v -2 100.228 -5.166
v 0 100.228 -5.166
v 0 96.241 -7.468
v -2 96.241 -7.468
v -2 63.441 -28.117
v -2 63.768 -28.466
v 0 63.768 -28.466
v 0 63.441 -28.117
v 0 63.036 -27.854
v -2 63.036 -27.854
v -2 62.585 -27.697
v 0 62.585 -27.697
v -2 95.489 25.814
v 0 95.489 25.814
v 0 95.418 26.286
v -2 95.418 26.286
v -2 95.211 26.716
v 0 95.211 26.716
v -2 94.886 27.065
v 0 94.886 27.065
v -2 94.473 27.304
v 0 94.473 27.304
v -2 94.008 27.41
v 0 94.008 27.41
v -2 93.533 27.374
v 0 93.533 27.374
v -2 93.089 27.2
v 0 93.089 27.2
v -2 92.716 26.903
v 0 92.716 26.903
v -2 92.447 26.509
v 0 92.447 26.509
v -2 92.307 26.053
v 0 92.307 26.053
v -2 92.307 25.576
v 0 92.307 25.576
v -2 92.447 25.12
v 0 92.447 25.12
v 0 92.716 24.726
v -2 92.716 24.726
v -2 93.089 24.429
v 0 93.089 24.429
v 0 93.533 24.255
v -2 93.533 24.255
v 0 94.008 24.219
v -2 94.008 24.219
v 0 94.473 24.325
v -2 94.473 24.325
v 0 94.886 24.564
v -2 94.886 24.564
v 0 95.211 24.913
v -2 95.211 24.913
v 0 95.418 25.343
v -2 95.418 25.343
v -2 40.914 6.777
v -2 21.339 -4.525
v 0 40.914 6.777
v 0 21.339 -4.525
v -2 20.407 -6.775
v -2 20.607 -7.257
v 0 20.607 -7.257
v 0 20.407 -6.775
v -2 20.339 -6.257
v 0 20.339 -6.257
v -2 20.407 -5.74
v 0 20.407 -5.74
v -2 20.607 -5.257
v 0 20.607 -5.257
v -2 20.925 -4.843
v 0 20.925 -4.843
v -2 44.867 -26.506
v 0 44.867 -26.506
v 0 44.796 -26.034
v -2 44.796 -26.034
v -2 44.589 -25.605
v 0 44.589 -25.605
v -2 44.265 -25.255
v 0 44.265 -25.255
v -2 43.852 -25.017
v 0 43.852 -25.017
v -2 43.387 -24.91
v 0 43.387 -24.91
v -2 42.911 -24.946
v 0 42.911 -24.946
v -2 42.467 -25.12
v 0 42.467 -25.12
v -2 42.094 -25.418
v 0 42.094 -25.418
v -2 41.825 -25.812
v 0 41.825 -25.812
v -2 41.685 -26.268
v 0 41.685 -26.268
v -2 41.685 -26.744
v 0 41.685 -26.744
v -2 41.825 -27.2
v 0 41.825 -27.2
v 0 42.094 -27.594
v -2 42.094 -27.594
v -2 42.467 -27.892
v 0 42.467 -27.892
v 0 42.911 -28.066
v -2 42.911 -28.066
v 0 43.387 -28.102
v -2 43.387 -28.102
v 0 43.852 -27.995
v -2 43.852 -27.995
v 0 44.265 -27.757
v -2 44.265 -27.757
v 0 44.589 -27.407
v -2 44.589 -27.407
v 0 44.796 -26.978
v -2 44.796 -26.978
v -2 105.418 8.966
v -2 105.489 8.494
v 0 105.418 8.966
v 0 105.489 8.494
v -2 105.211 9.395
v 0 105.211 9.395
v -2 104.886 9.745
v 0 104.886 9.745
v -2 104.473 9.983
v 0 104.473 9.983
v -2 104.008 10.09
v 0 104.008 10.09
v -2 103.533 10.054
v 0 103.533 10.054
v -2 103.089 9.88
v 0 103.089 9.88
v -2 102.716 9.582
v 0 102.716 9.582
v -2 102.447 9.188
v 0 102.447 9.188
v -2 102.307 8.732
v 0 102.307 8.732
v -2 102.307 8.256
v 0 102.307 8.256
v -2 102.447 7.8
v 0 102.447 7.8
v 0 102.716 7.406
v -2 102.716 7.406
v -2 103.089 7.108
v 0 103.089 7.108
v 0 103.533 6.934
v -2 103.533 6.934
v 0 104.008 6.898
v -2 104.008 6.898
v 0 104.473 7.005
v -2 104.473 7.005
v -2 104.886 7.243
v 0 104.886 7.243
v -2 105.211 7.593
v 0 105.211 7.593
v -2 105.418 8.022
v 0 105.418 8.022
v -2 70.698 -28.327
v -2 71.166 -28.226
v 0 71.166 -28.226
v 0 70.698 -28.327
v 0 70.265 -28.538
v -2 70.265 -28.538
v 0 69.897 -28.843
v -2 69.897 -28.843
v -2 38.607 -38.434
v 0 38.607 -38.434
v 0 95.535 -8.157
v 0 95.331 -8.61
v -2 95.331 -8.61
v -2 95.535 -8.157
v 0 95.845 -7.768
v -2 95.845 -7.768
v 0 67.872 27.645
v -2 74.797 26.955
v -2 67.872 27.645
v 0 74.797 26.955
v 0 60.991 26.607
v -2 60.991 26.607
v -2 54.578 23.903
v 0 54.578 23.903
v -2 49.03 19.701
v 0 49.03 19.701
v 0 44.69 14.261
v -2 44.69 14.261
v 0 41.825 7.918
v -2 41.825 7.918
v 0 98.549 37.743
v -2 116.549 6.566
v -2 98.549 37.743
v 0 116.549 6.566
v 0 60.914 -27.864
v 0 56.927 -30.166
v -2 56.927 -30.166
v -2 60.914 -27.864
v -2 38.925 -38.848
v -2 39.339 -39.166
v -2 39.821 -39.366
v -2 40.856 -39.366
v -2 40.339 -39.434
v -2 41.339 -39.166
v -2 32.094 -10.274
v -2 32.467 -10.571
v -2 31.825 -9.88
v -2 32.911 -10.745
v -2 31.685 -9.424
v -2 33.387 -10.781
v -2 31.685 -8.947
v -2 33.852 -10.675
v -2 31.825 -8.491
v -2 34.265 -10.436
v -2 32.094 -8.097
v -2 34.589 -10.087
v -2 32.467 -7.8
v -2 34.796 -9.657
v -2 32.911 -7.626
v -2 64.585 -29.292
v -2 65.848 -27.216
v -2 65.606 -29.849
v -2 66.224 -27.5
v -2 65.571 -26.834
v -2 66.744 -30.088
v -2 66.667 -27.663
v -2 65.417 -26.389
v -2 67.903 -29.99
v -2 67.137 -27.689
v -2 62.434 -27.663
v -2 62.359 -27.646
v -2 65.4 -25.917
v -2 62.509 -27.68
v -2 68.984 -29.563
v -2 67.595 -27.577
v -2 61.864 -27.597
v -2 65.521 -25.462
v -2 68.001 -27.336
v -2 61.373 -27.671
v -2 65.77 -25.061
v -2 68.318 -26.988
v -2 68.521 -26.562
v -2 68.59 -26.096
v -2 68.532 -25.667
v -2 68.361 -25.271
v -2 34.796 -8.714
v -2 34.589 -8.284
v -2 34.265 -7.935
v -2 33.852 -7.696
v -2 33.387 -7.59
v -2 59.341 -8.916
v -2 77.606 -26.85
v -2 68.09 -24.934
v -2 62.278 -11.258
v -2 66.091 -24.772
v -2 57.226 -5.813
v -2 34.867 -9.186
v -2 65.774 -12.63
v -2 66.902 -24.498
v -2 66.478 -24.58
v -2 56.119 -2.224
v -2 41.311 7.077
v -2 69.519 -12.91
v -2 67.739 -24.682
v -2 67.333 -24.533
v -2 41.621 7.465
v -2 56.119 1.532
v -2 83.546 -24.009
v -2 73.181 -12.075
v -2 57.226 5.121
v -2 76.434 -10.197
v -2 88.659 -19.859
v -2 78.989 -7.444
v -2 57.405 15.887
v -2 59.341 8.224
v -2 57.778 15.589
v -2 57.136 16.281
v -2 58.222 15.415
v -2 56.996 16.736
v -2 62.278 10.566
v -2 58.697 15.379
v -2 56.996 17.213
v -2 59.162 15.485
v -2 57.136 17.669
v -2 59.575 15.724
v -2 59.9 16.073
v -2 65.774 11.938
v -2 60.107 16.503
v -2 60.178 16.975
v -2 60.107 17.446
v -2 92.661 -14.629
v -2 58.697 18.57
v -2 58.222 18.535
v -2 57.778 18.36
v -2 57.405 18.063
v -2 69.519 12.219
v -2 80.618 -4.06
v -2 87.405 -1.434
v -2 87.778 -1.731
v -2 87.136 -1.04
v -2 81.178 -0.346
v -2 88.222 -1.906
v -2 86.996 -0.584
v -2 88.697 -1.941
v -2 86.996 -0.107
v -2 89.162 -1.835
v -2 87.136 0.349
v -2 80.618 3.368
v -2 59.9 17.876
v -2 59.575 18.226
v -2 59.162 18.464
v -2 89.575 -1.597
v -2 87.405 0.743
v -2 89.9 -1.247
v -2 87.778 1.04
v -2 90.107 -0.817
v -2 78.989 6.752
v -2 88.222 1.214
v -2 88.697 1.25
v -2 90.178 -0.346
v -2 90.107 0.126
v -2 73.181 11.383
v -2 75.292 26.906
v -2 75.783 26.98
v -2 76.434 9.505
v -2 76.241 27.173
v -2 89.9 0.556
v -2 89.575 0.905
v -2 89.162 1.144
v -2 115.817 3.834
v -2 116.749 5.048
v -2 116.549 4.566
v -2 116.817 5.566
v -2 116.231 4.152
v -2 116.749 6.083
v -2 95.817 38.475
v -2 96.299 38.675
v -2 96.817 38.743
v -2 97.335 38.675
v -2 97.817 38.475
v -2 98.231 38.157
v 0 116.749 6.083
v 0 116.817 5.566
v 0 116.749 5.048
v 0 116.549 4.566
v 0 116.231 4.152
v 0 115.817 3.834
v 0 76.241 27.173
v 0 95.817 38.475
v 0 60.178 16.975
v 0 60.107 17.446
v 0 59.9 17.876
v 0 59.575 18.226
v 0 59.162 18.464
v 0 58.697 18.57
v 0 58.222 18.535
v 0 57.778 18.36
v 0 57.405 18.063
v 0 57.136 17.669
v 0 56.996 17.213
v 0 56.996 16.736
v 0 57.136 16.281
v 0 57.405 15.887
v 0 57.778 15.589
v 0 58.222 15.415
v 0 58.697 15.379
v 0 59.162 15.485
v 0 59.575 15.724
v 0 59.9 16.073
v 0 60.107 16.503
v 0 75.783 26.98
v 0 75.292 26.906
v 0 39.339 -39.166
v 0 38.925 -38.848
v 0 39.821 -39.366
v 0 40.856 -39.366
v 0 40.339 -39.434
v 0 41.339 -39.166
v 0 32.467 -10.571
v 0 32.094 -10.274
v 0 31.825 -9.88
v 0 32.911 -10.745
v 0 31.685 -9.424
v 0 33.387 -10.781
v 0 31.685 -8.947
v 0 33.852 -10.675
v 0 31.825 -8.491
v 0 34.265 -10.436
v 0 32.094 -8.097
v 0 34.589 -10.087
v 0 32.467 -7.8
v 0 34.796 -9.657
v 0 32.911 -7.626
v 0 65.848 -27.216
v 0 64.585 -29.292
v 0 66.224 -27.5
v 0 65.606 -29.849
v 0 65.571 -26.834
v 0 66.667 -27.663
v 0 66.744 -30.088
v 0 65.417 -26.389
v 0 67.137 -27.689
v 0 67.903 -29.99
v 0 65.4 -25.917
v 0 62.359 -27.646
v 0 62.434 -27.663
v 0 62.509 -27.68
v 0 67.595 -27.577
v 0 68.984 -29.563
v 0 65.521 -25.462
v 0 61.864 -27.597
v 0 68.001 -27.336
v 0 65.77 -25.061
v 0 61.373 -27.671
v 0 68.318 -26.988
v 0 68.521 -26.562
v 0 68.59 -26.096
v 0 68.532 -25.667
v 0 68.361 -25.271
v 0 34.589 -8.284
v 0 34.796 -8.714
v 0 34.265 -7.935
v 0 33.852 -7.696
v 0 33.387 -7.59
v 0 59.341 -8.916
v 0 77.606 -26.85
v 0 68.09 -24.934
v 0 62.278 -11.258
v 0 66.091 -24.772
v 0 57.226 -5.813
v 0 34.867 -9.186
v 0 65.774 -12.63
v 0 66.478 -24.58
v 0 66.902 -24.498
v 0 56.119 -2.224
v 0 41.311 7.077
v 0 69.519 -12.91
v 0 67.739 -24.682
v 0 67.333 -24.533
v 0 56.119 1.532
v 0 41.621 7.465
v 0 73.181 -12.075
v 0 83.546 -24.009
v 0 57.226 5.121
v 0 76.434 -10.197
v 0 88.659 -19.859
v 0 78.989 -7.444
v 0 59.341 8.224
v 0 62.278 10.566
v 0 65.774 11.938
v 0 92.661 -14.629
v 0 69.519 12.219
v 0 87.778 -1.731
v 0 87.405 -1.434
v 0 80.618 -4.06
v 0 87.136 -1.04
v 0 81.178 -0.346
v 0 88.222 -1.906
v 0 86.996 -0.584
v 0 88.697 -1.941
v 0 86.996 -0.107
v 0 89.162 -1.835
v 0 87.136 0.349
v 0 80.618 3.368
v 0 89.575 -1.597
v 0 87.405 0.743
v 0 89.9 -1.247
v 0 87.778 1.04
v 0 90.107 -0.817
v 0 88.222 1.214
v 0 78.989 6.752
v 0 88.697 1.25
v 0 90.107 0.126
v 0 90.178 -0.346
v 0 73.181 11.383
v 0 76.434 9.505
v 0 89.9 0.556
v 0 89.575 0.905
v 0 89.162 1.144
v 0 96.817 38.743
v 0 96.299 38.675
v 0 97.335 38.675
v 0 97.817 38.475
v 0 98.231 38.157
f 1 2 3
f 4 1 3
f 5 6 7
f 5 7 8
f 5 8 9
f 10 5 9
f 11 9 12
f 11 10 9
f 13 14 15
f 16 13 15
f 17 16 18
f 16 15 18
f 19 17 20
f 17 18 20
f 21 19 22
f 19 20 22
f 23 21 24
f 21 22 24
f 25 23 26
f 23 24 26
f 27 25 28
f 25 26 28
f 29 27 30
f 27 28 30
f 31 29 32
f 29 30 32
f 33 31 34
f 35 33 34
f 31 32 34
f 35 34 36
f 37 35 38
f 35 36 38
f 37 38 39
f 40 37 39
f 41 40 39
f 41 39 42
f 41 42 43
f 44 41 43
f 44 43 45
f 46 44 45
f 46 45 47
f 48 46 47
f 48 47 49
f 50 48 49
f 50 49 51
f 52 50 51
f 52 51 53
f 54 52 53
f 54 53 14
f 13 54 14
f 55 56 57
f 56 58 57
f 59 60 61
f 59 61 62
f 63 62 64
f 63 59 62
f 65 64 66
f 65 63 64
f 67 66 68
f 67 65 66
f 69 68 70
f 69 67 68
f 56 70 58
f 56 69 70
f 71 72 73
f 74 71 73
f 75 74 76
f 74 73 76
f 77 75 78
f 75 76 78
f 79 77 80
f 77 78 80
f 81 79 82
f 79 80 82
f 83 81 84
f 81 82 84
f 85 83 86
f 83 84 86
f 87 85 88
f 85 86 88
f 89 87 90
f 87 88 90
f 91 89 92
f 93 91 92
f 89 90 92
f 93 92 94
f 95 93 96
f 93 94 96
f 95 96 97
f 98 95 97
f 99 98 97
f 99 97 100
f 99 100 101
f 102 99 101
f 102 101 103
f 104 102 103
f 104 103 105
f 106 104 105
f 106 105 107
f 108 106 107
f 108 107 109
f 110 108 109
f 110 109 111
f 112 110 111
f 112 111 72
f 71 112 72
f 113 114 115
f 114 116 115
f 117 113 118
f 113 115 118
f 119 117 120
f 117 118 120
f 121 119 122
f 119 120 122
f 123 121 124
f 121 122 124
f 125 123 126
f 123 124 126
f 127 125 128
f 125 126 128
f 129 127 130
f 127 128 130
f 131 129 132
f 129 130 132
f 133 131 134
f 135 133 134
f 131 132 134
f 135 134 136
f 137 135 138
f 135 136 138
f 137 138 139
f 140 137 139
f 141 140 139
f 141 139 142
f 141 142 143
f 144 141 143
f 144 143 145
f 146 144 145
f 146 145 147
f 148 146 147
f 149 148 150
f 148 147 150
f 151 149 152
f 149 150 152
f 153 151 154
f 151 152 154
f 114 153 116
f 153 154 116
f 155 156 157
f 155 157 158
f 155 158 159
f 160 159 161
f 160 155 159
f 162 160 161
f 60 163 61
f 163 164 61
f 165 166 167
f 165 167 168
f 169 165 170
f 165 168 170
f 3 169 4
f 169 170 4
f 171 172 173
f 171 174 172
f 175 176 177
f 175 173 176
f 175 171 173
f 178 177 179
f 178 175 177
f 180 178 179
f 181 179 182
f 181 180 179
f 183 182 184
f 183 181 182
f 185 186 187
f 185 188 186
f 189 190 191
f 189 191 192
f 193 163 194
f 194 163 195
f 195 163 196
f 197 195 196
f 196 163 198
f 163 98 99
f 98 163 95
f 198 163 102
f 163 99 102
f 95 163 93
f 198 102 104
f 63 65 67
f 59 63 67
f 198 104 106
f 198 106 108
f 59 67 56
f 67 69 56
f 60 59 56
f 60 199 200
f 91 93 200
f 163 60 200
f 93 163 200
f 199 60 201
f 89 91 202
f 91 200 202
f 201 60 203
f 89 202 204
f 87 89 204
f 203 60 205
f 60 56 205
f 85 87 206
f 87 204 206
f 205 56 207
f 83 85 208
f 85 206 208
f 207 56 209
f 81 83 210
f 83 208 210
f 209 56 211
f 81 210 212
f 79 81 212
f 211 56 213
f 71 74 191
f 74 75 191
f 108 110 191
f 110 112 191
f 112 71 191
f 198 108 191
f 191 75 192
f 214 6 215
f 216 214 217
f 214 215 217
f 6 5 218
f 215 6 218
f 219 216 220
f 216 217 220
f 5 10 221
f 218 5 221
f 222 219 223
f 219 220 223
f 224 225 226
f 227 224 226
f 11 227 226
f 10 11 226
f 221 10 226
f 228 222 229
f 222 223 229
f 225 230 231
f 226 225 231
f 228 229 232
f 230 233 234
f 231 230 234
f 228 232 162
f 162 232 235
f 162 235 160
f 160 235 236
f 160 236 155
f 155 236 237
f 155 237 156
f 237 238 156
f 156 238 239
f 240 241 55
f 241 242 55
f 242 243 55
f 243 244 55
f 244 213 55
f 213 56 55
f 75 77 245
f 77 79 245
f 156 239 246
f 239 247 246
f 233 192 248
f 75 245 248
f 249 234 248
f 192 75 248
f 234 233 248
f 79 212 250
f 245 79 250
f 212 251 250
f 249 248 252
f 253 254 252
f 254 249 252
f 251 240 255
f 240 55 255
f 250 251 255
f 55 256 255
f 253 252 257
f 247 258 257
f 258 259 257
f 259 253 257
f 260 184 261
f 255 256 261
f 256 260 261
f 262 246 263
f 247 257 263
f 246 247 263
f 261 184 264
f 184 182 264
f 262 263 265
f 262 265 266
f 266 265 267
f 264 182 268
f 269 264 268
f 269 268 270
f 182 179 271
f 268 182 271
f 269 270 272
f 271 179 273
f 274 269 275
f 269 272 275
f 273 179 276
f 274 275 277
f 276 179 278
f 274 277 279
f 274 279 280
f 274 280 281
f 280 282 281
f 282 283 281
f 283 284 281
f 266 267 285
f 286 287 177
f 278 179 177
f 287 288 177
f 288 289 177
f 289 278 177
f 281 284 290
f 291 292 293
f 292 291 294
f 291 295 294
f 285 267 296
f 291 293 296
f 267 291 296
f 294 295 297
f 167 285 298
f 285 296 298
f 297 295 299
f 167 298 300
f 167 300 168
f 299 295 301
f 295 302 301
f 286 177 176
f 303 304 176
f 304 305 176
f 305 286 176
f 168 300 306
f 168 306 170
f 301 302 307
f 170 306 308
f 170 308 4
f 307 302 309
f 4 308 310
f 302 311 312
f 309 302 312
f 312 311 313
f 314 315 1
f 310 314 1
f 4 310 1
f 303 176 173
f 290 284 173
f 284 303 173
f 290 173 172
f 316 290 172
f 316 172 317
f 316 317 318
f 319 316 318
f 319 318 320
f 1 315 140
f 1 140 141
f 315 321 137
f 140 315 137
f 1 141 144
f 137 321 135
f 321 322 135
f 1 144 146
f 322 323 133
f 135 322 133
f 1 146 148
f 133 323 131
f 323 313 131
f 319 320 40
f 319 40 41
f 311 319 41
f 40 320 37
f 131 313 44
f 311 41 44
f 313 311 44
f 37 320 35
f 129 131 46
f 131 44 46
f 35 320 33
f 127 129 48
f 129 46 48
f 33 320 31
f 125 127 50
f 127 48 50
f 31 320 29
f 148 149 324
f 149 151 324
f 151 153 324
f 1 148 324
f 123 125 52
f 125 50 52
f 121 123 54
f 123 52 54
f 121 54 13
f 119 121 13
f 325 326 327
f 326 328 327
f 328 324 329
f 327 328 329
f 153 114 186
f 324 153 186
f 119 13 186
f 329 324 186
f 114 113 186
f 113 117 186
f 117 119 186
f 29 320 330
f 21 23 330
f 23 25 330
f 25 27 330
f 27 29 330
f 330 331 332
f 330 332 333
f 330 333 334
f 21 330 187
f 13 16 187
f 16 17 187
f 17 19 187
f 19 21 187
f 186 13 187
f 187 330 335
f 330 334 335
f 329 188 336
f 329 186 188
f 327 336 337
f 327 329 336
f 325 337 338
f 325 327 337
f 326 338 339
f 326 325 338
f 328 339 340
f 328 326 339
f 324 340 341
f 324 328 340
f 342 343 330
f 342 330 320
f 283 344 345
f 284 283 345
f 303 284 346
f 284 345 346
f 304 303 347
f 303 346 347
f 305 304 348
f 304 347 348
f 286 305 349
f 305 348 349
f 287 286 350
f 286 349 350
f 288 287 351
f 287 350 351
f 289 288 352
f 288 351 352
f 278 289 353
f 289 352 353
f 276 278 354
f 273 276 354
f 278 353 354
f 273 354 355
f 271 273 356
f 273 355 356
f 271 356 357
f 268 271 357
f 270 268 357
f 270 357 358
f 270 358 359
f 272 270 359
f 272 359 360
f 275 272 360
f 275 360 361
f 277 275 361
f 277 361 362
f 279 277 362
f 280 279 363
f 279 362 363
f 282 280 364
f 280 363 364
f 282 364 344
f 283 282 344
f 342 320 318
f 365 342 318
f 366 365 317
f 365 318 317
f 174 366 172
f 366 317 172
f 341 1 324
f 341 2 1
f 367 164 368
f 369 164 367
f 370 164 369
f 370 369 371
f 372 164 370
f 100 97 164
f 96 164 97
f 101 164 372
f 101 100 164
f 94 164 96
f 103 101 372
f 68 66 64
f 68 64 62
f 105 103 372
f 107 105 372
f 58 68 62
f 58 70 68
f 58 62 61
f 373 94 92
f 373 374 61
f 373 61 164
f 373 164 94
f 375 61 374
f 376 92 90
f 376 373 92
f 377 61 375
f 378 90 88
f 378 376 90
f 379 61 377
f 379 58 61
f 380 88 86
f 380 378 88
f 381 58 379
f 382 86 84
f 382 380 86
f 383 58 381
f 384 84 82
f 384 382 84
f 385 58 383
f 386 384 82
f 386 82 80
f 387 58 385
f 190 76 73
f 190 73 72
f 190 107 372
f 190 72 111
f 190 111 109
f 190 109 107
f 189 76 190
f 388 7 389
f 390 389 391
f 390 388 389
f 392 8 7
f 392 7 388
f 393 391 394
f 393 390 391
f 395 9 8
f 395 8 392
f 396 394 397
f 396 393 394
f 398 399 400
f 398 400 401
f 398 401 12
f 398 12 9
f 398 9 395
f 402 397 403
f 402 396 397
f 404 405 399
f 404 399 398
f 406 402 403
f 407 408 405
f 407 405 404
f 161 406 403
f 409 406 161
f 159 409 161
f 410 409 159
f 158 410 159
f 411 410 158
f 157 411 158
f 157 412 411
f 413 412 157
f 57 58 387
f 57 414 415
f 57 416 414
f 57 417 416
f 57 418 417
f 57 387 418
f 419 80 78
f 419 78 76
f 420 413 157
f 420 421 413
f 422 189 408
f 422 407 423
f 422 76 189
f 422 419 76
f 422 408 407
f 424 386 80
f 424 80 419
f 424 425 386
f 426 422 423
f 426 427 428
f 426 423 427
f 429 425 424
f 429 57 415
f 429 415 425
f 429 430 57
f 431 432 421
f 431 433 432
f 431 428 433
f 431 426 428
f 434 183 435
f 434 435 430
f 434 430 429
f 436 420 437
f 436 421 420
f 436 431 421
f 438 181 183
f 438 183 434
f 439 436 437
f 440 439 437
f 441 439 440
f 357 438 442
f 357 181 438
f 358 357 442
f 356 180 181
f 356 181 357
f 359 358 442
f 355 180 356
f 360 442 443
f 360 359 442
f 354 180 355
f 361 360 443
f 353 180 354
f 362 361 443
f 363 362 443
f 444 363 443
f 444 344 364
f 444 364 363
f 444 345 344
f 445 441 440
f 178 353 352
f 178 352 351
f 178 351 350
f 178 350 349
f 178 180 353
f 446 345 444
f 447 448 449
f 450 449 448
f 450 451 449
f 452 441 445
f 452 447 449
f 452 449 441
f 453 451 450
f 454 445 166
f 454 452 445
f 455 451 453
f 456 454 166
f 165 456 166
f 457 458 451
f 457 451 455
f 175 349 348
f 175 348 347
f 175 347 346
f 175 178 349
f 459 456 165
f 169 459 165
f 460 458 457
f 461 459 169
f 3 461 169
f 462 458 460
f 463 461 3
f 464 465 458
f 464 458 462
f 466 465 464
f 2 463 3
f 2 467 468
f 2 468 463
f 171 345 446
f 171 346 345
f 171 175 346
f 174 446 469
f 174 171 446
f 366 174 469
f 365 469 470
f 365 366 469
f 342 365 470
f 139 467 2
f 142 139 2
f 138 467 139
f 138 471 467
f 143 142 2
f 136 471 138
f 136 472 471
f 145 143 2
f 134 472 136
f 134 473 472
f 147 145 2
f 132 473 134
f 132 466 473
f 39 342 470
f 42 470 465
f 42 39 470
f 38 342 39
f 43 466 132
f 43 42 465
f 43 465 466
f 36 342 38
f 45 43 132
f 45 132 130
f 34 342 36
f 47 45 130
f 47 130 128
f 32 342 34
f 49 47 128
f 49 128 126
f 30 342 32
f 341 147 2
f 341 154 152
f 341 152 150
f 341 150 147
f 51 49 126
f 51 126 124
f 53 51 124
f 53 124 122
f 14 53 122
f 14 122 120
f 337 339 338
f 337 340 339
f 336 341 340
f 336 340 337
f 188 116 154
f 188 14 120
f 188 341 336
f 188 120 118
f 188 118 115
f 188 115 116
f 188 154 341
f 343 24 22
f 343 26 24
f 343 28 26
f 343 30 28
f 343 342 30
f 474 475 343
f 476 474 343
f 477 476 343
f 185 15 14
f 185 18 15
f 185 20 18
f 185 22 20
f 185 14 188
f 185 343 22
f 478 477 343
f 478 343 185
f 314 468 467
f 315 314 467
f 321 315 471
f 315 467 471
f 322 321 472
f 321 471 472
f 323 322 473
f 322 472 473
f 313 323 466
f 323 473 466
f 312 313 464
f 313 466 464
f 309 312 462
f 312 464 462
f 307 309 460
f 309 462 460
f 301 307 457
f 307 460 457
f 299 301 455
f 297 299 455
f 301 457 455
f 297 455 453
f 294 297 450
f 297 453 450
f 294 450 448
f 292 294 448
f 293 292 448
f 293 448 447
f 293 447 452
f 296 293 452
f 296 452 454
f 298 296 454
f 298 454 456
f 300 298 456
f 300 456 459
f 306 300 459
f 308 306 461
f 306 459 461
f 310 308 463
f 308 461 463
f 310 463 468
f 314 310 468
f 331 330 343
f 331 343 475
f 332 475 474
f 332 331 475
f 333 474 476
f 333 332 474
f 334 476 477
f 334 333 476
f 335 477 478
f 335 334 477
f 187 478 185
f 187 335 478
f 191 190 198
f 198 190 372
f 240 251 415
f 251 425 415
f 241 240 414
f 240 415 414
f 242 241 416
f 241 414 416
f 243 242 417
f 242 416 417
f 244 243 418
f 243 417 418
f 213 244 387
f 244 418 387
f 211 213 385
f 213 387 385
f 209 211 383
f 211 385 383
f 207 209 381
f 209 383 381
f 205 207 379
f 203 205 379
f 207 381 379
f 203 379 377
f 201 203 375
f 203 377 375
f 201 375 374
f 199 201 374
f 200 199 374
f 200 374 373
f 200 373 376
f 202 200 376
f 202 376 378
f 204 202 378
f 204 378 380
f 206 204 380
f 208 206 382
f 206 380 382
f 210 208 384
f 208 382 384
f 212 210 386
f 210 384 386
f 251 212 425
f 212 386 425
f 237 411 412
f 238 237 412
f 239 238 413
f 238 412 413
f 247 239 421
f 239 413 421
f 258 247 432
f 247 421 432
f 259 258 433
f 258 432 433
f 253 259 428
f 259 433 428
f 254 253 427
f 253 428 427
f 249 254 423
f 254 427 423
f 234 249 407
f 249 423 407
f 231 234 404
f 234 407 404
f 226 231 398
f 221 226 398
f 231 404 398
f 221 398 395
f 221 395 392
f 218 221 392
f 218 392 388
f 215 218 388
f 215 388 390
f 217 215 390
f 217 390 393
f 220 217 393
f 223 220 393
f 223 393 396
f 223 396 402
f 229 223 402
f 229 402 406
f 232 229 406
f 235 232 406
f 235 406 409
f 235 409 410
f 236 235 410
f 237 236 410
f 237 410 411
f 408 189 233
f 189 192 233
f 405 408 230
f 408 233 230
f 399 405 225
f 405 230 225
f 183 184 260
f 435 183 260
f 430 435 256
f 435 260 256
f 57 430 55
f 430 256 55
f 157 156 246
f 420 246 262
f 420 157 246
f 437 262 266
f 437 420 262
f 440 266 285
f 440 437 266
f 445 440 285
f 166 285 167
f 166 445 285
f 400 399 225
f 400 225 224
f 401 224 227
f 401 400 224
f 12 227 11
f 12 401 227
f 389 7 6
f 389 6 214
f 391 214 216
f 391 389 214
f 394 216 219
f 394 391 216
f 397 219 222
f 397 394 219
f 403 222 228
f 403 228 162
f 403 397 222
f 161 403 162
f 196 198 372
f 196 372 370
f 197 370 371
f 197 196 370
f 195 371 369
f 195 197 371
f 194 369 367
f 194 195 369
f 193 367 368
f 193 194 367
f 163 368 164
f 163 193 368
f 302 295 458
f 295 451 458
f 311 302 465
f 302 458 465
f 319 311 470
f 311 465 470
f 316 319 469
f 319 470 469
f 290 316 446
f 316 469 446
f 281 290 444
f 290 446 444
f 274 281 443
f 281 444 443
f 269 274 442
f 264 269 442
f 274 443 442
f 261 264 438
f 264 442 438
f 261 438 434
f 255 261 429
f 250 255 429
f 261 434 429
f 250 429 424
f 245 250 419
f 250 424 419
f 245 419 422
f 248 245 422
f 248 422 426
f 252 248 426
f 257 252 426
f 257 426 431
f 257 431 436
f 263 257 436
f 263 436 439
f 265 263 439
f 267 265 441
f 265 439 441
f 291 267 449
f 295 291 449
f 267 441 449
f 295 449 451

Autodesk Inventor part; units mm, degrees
ref_plane "YZ Plane" through (0, 0, 0) normal (1, 0, 0) x (0, 1, 0)
ref_plane "XZ Plane" through (0, 0, 0) normal (0, 1, 0) x (-1, 0, 0)
ref_plane "XY Plane" through (0, 0, 0) normal (0, 0, 1) x (1, 0, 0)
sketch "スケッチ5" plane through (0, 0, 0) normal (1, 0, 0) x (0, 1, 0)
  circle A0 centre (68.5779, -0.3457) radius 120
  line L0 (68.5779, -0.3457) -> (-262.8846, -0.3457) construction
  line L1 (136.0779, -117.2592) -> (-66.4221, -0.3457)
  circle A1 centre (68.5779, -0.3457) radius 5
  line L2 (68.5779, -0.3457) -> (136.0779, 116.5677) construction
  line L3 (68.5779, -0.3457) -> (136.0779, -117.2592) construction
  line L4 (68.5779, -0.3457) -> (-66.4221, -0.3457)
  line L5 (85.6138, 37.1613) -> (80.6138, 28.5011) construction
  line L6 (80.6138, 28.5011) -> (84.0779, 26.5011) construction
  line L7 (84.0779, 26.5011) -> (89.0779, 35.1613) construction
  line L8 (89.0779, 35.1613) -> (85.6138, 37.1613)
  line L9 (89.0779, 35.1613) -> (84.0779, 26.5011) construction
  line L10 (84.0779, 26.5011) -> (87.542, 24.5011) construction
  line L11 (87.542, 24.5011) -> (92.542, 33.1613) construction
  line L12 (92.542, 33.1613) -> (89.0779, 35.1613)
  line L13 (83.1138, 32.8312) -> (90.042, 28.8312) construction
  circle A2 centre (68.5779, -0.3457) radius 2.65 construction
  line L14 (85.3973, 37.2863) -> (78.8973, 26.028) construction
  line L15 (78.8973, 26.028) -> (74.5672, 28.528) construction
  line L16 (74.5672, 28.528) -> (81.0672, 39.7863) construction
  line L17 (81.0672, 39.7863) -> (85.3973, 37.2863)
  line L18 (92.7585, 33.0363) -> (86.2585, 21.778) construction
  line L19 (86.2585, 21.778) -> (90.5886, 19.278) construction
  line L20 (90.5886, 19.278) -> (97.0886, 30.5363) construction
  line L21 (97.0886, 30.5363) -> (92.7585, 33.0363)
  circle A3 centre (68.5779, -0.3457) radius 28.3207 construction
  line L22 (27.5779, 8.9043) -> (27.5779, 3.9043)
  line L23 (27.5779, 3.9043) -> (40.5779, 3.9043) construction
  line L24 (40.5779, 8.9043) -> (27.5779, 8.9043) construction
  line L25 (40.5779, 3.9043) -> (40.5779, 8.9043)
  line L26 (27.5779, -4.5957) -> (40.5779, -4.5957) construction
  line L27 (27.5779, -9.5957) -> (27.5779, -4.5957)
  line L28 (40.5779, -9.5957) -> (27.5779, -9.5957) construction
  line L29 (40.5779, -4.5957) -> (40.5779, -9.5957)
  line L30 (81.0672, -40.4778) -> (85.3973, -37.9778)
  line L31 (85.3973, -37.9778) -> (78.8973, -26.7194) construction
  line L32 (74.5672, -29.2194) -> (81.0672, -40.4778) construction
  line L33 (78.8973, -26.7194) -> (74.5672, -29.2194) construction
  line L34 (92.7585, -33.7278) -> (86.2585, -22.4694) construction
  line L35 (97.0886, -31.2278) -> (92.7585, -33.7278)
  line L36 (90.5886, -19.9694) -> (97.0886, -31.2278) construction
  line L37 (86.2585, -22.4694) -> (90.5886, -19.9694) construction
  line L38 (74.5672, 28.528) -> (73.9509, 27.4606)
  line L39 (90.5886, 19.278) -> (89.9724, 18.2106) construction
  line L40 (40.5779, 8.9043) -> (41.8104, 8.9043)
  line L41 (40.5779, -9.5957) -> (41.8104, -9.5957)
  line L42 (74.5672, -29.2194) -> (70.7713, -22.6449)
  line L43 (90.5886, -19.9694) -> (89.9724, -18.9021) construction
  line L44 (82.1888, 31.229) -> (72.1888, 13.9085) construction
  line L45 (72.1888, 13.9085) -> (66.9926, 16.9085) construction
  line L46 (66.9926, 16.9085) -> (76.9926, 34.229) construction
  line L47 (76.9926, 34.229) -> (82.1888, 31.229)
  circle A4 centre (72.0907, 19.7387) radius 1.5
  circle A5 centre (77.0907, 28.3989) radius 1.5
  circle A6 centre (84.2151, 12.7387) radius 1.5
  circle A7 centre (89.2151, 21.3989) radius 1.5
  circle A8 centre (39.4279, 6.6543) radius 1.5
  circle A9 centre (49.4279, 6.6543) radius 1.5
  circle A10 centre (49.4279, -7.3457) radius 1.5
  circle A11 centre (39.4279, -7.3457) radius 1.5
  circle A12 centre (77.0907, -29.0904) radius 1.5
  circle A13 centre (72.0907, -20.4301) radius 1.5
  circle A14 centre (84.2151, -13.4301) radius 1.5
  circle A15 centre (89.2151, -22.0904) radius 1.5
  line L48 (69.5907, 15.4085) -> (82.1888, 31.229) construction
  circle A16 centre (68.5779, -0.3457) radius 34.3835
  line L49 (60.5779, 46.6543) -> (-119.4221, 46.6543) construction
  line L50 (-119.4221, 46.6543) -> (-119.4221, 31.6543)
  line L51 (-119.4221, 31.6543) -> (60.5779, 31.6543) construction
  line L52 (60.5779, 31.6543) -> (60.5779, 46.6543) construction
  circle A17 centre (50.5779, 39.1543) radius 1.5 construction
  circle A18 centre (40.5779, 39.1543) radius 1.5 construction
  line L53 (34.1944, 46.6543) -> (34.1944, -0.3457) construction
  line L54 (60.5779, 46.6543) -> (87.898, 28.0965) construction
  line L55 (34.1944, -47.3457) -> (34.1944, -0.3457) construction
  line L56 (60.5779, -47.3457) -> (87.898, -28.7879) construction
  line L57 (60.5779, -47.3457) -> (-119.4221, -47.3457) construction
  line L58 (-119.4221, -32.3457) -> (60.5779, -32.3457) construction
  circle A19 centre (40.5779, -39.8457) radius 1.5 construction
  circle A20 centre (50.5779, -39.8457) radius 1.5 construction
  line L59 (68.5779, -0.3457) -> (51.3862, 29.4312)
  line L60 (53.2382, 46.2235) -> (35.9176, 36.2235)
  line L61 (35.9176, 36.2235) -> (40.9176, 27.5632)
  line L62 (40.9176, 27.5632) -> (58.2382, 37.5632)
  line L63 (58.2382, 37.5632) -> (53.2382, 46.2235)
  circle A21 centre (51.408, 39.3934) radius 1.5
  circle A22 centre (42.7478, 34.3934) radius 1.5
  circle A23 centre (42.7478, -35.0848) radius 1.5
  circle A24 centre (51.408, -40.0848) radius 1.5
  circle A25 centre (111.5779, -5.3457) radius 1.5
  circle A26 centre (111.5779, 4.6543) radius 1.5
  circle A27 centre (68.5779, -0.3457) radius 193.5
  line L64 (-124.2868, 15.3208) -> (151.4426, 174.5133)
  line L65 (68.5779, -0.3457) -> (8.5779, 103.5773)
  line L66 (68.5779, -0.3457) -> (68.5779, 193.1543)
  line L67 (117.549, 4.8338) -> (16.049, 180.6369)
  line L68 (16.049, 180.6369) -> (-1.2715, 170.6369)
  line L69 (-1.2715, 170.6369) -> (100.2285, -5.1662)
  line L70 (100.2285, -5.1662) -> (117.549, 4.8338)
  circle A28 centre (37.9737, 117.6622) radius 1.5
  circle A29 centre (13.3039, 170.3917) radius 1.5
  circle A30 centre (58.5779, 16.9748) radius 1.6
  circle A31 centre (68.5779, -0.3457) radius 10 construction
  circle A32 centre (103.8888, 8.494) radius 1.6
  circle A33 centre (93.8888, 25.8145) radius 1.6
  line L71 (117.549, 4.8338) -> (90.6574, -10.6921)
  line L72 (97.549, 39.4748) -> (64.1622, 20.1989)
  line L73 (19.6068, -5.5252) -> (52.9936, 13.7507)
  circle A34 centre (33.267, -9.1855) radius 1.6
  circle A35 centre (43.267, -26.506) radius 1.6
  line L74 (39.6068, -40.1662) -> (-61.8932, 135.6369)
  line L75 (56.9273, -30.1662) -> (39.6068, -40.1662)
  line L76 (39.6068, -40.1662) -> (66.4984, -24.6404)
  line L77 (68.5779, -0.3457) -> (51.3862, -30.1227)
  line L78 (69.2071, -12.256) -> (57.9487, -5.756) construction
  line L79 (57.9487, -5.756) -> (48.9487, -21.3444) construction
  line L80 (48.9487, -21.3444) -> (60.2071, -27.8444) construction
  line L81 (60.2071, -27.8444) -> (69.2071, -12.256) construction
  circle A36 centre (68.5779, -0.3457) radius 28
  circle A37 centre (68.5779, -0.3457) radius 38 construction
  circle A38 centre (68.5779, -0.3457) radius 12.6
  circle A39 centre (58.5779, -17.6662) radius 1.6
  circle A40 centre (88.5779, -0.3457) radius 1.6
  circle A41 centre (66.9902, -26.0957) radius 4
  circle A42 centre (66.9902, -26.0957) radius 1.6
  line L82 (58.2382, 37.5632) -> (60.7896, 33.144)
  line L83 (40.9176, 27.5632) -> (43.4691, 23.144)
  line L84 (58.2382, -38.2547) -> (60.7896, -33.8355)
  line L85 (53.2382, -46.915) -> (58.2382, -38.2547)
  line L86 (35.9176, -36.915) -> (53.2382, -46.915)
  circle A43 centre (51.408, -40.0848) radius 1.5
  circle A44 centre (42.7478, -35.0848) radius 1.5
  line L87 (40.9176, -28.2547) -> (35.9176, -36.915)
  line L88 (40.9176, -28.2547) -> (43.4691, -23.8355)
  line L89 (106.5779, 9.6543) -> (101.4751, 9.6543)
  line L90 (116.5779, 9.6543) -> (106.5779, 9.6543)
  line L91 (116.5779, -10.3457) -> (116.5779, 9.6543)
  circle A45 centre (111.5779, 4.6543) radius 1.5
  circle A46 centre (111.5779, -5.3457) radius 1.5
  line L92 (106.5779, -10.3457) -> (116.5779, -10.3457)
  line L93 (106.5779, -10.3457) -> (101.4751, -10.3457)
  point P0 (0, 0)
  point P1 (53.4487, -13.5502)
  point P2 (44.5779, 41.2235)
  point P3 (44.5779, -41.915)
  point P4 (116.5779, -0.3457)
  point P5 (41.6073, 7.1768)
  point P6 (61.6073, -27.4642)
  point P7 (63.4018, -27.8632)
  point P8 (70.3342, -28.2906)
  point P9 (95.5485, -7.8683)
  point P10 (100.2285, -5.1662)
  point P11 (75.5485, 26.7727)
  dimension "d169" = 3
  dimension "d170" = 3
  dimension "d171" = 10
  dimension "d172" = 10
  dimension "d173" = 7.5
  dimension "d174" = 7.5
  dimension "d175" = 60
  dimension "d176" = 10
  dimension "d177" = 10
  dimension "d178" = 10
  dimension "d179" = 3
  dimension "d180" = 5
  dimension "d181" = 5
  dimension "d182" = 360
  dimension "d183" = 387
  dimension "d184" = 110
  dimension "d185" = 60
  dimension "d186" = 20
  dimension "d187" = 73
  dimension "d188" = 3
  dimension "d189" = 3
  dimension "d190" = 7.5
  dimension "d191" = 7.5
  dimension "d192" = 7.5
  dimension "d193" = 7.5
  dimension "d194" = 3.2
  dimension "d195" = 20
  dimension "d196" = 20
  dimension "d197" = 3.2
  dimension "d198" = 3.2
  dimension "d199" = 10
  dimension "d200" = 10
  dimension "d201" = 10
  dimension "d202" = 20
  dimension "d203" = 10
  dimension "d204" = 120
  dimension "d205" = 13
  dimension "d206" = 18
  dimension "d207" = 6.5
  dimension "d208" = 56
  dimension "d209" = 10
  dimension "d210" = 25.2
  dimension "d211" = 25
  dimension "d212" = 20
  dimension "d213" = 360
  dimension "d214" = 8
  dimension "d215" = 5
  dimension "d216" = 5
  dimension "d217" = 3.2
  dimension "d218" = 360
extrude "押し出し4" add sketch "スケッチ5" against normal blind 2 contours L67 L90 L89 A32 A16 L72 | L67 L91 L70 A16 L89 A32 L90 | A36 L72 L66 | L66 A38 L59 A30 A36 | L67 L70 L91 | A16 L70 L69 A36 L72 | L73 A16 L4 | L4 A16 L88 A35 L87 L74 L73 | L69 A36 L72 A5 | L72 A36 L69 A41 L76 L77 A39 A38 L66 | L59 A30 A38 L4 A36 | A16 L73 A8 A36 L4 | L4 A36 L77 A16 | L87 L88 A35 A16 L75 L86 L74 | A36 L69 | A5 L72 | A38 L77 A1 L66 | L66 A1 L59 A38 | L4 A38 L77 A39 A36 | L73 L25 A8 | L86 L75 L74 | L69 L71 A36 | L59 A1 L4 A38 | A8 L25 L73 | L4 A1 L77 A38 | A36 L76 L75 A16 L77 | A39 L77 | L77 A39 | L76 A41 A36 | A41 A36 | A36 A41 | A11 L29 | L29 A11 | A4 | A6 | A7 | A9 | A10 | A13 | A14 | A23 | A26 picked at (77.6802, 27.4001) picked at (39.3486, 5.7524) picked at (40.6415, 6.0852)
extrude "押し出し5" cut sketch "スケッチ5" against normal blind 2 contours A38 L77 A1 L66 | L66 A1 L59 A38 | L59 A1 L4 A38 | L4 A1 L77 A38
fillet "フィレット4" radius 2 10 edges at (-1, 95.5485, -7.8683) (-1, 117.549, 4.8338) (-1, 97.549, 39.4748) (-1, 75.5485, 26.7727) (-1, 41.6073, 7.1768) (-1, 19.6068, -5.5252) (-1, 39.6068, -40.1662) (-1, 61.6073, -27.4642) (-1, 63.4018, -27.8632) (-1, 70.3342, -28.2906)
equation "\"d174\" = d173"
equation "\"d200\" = d201"
properties part number "hand-grab-v3-Plate-ASP_F" material "アルミニウム 6061"
